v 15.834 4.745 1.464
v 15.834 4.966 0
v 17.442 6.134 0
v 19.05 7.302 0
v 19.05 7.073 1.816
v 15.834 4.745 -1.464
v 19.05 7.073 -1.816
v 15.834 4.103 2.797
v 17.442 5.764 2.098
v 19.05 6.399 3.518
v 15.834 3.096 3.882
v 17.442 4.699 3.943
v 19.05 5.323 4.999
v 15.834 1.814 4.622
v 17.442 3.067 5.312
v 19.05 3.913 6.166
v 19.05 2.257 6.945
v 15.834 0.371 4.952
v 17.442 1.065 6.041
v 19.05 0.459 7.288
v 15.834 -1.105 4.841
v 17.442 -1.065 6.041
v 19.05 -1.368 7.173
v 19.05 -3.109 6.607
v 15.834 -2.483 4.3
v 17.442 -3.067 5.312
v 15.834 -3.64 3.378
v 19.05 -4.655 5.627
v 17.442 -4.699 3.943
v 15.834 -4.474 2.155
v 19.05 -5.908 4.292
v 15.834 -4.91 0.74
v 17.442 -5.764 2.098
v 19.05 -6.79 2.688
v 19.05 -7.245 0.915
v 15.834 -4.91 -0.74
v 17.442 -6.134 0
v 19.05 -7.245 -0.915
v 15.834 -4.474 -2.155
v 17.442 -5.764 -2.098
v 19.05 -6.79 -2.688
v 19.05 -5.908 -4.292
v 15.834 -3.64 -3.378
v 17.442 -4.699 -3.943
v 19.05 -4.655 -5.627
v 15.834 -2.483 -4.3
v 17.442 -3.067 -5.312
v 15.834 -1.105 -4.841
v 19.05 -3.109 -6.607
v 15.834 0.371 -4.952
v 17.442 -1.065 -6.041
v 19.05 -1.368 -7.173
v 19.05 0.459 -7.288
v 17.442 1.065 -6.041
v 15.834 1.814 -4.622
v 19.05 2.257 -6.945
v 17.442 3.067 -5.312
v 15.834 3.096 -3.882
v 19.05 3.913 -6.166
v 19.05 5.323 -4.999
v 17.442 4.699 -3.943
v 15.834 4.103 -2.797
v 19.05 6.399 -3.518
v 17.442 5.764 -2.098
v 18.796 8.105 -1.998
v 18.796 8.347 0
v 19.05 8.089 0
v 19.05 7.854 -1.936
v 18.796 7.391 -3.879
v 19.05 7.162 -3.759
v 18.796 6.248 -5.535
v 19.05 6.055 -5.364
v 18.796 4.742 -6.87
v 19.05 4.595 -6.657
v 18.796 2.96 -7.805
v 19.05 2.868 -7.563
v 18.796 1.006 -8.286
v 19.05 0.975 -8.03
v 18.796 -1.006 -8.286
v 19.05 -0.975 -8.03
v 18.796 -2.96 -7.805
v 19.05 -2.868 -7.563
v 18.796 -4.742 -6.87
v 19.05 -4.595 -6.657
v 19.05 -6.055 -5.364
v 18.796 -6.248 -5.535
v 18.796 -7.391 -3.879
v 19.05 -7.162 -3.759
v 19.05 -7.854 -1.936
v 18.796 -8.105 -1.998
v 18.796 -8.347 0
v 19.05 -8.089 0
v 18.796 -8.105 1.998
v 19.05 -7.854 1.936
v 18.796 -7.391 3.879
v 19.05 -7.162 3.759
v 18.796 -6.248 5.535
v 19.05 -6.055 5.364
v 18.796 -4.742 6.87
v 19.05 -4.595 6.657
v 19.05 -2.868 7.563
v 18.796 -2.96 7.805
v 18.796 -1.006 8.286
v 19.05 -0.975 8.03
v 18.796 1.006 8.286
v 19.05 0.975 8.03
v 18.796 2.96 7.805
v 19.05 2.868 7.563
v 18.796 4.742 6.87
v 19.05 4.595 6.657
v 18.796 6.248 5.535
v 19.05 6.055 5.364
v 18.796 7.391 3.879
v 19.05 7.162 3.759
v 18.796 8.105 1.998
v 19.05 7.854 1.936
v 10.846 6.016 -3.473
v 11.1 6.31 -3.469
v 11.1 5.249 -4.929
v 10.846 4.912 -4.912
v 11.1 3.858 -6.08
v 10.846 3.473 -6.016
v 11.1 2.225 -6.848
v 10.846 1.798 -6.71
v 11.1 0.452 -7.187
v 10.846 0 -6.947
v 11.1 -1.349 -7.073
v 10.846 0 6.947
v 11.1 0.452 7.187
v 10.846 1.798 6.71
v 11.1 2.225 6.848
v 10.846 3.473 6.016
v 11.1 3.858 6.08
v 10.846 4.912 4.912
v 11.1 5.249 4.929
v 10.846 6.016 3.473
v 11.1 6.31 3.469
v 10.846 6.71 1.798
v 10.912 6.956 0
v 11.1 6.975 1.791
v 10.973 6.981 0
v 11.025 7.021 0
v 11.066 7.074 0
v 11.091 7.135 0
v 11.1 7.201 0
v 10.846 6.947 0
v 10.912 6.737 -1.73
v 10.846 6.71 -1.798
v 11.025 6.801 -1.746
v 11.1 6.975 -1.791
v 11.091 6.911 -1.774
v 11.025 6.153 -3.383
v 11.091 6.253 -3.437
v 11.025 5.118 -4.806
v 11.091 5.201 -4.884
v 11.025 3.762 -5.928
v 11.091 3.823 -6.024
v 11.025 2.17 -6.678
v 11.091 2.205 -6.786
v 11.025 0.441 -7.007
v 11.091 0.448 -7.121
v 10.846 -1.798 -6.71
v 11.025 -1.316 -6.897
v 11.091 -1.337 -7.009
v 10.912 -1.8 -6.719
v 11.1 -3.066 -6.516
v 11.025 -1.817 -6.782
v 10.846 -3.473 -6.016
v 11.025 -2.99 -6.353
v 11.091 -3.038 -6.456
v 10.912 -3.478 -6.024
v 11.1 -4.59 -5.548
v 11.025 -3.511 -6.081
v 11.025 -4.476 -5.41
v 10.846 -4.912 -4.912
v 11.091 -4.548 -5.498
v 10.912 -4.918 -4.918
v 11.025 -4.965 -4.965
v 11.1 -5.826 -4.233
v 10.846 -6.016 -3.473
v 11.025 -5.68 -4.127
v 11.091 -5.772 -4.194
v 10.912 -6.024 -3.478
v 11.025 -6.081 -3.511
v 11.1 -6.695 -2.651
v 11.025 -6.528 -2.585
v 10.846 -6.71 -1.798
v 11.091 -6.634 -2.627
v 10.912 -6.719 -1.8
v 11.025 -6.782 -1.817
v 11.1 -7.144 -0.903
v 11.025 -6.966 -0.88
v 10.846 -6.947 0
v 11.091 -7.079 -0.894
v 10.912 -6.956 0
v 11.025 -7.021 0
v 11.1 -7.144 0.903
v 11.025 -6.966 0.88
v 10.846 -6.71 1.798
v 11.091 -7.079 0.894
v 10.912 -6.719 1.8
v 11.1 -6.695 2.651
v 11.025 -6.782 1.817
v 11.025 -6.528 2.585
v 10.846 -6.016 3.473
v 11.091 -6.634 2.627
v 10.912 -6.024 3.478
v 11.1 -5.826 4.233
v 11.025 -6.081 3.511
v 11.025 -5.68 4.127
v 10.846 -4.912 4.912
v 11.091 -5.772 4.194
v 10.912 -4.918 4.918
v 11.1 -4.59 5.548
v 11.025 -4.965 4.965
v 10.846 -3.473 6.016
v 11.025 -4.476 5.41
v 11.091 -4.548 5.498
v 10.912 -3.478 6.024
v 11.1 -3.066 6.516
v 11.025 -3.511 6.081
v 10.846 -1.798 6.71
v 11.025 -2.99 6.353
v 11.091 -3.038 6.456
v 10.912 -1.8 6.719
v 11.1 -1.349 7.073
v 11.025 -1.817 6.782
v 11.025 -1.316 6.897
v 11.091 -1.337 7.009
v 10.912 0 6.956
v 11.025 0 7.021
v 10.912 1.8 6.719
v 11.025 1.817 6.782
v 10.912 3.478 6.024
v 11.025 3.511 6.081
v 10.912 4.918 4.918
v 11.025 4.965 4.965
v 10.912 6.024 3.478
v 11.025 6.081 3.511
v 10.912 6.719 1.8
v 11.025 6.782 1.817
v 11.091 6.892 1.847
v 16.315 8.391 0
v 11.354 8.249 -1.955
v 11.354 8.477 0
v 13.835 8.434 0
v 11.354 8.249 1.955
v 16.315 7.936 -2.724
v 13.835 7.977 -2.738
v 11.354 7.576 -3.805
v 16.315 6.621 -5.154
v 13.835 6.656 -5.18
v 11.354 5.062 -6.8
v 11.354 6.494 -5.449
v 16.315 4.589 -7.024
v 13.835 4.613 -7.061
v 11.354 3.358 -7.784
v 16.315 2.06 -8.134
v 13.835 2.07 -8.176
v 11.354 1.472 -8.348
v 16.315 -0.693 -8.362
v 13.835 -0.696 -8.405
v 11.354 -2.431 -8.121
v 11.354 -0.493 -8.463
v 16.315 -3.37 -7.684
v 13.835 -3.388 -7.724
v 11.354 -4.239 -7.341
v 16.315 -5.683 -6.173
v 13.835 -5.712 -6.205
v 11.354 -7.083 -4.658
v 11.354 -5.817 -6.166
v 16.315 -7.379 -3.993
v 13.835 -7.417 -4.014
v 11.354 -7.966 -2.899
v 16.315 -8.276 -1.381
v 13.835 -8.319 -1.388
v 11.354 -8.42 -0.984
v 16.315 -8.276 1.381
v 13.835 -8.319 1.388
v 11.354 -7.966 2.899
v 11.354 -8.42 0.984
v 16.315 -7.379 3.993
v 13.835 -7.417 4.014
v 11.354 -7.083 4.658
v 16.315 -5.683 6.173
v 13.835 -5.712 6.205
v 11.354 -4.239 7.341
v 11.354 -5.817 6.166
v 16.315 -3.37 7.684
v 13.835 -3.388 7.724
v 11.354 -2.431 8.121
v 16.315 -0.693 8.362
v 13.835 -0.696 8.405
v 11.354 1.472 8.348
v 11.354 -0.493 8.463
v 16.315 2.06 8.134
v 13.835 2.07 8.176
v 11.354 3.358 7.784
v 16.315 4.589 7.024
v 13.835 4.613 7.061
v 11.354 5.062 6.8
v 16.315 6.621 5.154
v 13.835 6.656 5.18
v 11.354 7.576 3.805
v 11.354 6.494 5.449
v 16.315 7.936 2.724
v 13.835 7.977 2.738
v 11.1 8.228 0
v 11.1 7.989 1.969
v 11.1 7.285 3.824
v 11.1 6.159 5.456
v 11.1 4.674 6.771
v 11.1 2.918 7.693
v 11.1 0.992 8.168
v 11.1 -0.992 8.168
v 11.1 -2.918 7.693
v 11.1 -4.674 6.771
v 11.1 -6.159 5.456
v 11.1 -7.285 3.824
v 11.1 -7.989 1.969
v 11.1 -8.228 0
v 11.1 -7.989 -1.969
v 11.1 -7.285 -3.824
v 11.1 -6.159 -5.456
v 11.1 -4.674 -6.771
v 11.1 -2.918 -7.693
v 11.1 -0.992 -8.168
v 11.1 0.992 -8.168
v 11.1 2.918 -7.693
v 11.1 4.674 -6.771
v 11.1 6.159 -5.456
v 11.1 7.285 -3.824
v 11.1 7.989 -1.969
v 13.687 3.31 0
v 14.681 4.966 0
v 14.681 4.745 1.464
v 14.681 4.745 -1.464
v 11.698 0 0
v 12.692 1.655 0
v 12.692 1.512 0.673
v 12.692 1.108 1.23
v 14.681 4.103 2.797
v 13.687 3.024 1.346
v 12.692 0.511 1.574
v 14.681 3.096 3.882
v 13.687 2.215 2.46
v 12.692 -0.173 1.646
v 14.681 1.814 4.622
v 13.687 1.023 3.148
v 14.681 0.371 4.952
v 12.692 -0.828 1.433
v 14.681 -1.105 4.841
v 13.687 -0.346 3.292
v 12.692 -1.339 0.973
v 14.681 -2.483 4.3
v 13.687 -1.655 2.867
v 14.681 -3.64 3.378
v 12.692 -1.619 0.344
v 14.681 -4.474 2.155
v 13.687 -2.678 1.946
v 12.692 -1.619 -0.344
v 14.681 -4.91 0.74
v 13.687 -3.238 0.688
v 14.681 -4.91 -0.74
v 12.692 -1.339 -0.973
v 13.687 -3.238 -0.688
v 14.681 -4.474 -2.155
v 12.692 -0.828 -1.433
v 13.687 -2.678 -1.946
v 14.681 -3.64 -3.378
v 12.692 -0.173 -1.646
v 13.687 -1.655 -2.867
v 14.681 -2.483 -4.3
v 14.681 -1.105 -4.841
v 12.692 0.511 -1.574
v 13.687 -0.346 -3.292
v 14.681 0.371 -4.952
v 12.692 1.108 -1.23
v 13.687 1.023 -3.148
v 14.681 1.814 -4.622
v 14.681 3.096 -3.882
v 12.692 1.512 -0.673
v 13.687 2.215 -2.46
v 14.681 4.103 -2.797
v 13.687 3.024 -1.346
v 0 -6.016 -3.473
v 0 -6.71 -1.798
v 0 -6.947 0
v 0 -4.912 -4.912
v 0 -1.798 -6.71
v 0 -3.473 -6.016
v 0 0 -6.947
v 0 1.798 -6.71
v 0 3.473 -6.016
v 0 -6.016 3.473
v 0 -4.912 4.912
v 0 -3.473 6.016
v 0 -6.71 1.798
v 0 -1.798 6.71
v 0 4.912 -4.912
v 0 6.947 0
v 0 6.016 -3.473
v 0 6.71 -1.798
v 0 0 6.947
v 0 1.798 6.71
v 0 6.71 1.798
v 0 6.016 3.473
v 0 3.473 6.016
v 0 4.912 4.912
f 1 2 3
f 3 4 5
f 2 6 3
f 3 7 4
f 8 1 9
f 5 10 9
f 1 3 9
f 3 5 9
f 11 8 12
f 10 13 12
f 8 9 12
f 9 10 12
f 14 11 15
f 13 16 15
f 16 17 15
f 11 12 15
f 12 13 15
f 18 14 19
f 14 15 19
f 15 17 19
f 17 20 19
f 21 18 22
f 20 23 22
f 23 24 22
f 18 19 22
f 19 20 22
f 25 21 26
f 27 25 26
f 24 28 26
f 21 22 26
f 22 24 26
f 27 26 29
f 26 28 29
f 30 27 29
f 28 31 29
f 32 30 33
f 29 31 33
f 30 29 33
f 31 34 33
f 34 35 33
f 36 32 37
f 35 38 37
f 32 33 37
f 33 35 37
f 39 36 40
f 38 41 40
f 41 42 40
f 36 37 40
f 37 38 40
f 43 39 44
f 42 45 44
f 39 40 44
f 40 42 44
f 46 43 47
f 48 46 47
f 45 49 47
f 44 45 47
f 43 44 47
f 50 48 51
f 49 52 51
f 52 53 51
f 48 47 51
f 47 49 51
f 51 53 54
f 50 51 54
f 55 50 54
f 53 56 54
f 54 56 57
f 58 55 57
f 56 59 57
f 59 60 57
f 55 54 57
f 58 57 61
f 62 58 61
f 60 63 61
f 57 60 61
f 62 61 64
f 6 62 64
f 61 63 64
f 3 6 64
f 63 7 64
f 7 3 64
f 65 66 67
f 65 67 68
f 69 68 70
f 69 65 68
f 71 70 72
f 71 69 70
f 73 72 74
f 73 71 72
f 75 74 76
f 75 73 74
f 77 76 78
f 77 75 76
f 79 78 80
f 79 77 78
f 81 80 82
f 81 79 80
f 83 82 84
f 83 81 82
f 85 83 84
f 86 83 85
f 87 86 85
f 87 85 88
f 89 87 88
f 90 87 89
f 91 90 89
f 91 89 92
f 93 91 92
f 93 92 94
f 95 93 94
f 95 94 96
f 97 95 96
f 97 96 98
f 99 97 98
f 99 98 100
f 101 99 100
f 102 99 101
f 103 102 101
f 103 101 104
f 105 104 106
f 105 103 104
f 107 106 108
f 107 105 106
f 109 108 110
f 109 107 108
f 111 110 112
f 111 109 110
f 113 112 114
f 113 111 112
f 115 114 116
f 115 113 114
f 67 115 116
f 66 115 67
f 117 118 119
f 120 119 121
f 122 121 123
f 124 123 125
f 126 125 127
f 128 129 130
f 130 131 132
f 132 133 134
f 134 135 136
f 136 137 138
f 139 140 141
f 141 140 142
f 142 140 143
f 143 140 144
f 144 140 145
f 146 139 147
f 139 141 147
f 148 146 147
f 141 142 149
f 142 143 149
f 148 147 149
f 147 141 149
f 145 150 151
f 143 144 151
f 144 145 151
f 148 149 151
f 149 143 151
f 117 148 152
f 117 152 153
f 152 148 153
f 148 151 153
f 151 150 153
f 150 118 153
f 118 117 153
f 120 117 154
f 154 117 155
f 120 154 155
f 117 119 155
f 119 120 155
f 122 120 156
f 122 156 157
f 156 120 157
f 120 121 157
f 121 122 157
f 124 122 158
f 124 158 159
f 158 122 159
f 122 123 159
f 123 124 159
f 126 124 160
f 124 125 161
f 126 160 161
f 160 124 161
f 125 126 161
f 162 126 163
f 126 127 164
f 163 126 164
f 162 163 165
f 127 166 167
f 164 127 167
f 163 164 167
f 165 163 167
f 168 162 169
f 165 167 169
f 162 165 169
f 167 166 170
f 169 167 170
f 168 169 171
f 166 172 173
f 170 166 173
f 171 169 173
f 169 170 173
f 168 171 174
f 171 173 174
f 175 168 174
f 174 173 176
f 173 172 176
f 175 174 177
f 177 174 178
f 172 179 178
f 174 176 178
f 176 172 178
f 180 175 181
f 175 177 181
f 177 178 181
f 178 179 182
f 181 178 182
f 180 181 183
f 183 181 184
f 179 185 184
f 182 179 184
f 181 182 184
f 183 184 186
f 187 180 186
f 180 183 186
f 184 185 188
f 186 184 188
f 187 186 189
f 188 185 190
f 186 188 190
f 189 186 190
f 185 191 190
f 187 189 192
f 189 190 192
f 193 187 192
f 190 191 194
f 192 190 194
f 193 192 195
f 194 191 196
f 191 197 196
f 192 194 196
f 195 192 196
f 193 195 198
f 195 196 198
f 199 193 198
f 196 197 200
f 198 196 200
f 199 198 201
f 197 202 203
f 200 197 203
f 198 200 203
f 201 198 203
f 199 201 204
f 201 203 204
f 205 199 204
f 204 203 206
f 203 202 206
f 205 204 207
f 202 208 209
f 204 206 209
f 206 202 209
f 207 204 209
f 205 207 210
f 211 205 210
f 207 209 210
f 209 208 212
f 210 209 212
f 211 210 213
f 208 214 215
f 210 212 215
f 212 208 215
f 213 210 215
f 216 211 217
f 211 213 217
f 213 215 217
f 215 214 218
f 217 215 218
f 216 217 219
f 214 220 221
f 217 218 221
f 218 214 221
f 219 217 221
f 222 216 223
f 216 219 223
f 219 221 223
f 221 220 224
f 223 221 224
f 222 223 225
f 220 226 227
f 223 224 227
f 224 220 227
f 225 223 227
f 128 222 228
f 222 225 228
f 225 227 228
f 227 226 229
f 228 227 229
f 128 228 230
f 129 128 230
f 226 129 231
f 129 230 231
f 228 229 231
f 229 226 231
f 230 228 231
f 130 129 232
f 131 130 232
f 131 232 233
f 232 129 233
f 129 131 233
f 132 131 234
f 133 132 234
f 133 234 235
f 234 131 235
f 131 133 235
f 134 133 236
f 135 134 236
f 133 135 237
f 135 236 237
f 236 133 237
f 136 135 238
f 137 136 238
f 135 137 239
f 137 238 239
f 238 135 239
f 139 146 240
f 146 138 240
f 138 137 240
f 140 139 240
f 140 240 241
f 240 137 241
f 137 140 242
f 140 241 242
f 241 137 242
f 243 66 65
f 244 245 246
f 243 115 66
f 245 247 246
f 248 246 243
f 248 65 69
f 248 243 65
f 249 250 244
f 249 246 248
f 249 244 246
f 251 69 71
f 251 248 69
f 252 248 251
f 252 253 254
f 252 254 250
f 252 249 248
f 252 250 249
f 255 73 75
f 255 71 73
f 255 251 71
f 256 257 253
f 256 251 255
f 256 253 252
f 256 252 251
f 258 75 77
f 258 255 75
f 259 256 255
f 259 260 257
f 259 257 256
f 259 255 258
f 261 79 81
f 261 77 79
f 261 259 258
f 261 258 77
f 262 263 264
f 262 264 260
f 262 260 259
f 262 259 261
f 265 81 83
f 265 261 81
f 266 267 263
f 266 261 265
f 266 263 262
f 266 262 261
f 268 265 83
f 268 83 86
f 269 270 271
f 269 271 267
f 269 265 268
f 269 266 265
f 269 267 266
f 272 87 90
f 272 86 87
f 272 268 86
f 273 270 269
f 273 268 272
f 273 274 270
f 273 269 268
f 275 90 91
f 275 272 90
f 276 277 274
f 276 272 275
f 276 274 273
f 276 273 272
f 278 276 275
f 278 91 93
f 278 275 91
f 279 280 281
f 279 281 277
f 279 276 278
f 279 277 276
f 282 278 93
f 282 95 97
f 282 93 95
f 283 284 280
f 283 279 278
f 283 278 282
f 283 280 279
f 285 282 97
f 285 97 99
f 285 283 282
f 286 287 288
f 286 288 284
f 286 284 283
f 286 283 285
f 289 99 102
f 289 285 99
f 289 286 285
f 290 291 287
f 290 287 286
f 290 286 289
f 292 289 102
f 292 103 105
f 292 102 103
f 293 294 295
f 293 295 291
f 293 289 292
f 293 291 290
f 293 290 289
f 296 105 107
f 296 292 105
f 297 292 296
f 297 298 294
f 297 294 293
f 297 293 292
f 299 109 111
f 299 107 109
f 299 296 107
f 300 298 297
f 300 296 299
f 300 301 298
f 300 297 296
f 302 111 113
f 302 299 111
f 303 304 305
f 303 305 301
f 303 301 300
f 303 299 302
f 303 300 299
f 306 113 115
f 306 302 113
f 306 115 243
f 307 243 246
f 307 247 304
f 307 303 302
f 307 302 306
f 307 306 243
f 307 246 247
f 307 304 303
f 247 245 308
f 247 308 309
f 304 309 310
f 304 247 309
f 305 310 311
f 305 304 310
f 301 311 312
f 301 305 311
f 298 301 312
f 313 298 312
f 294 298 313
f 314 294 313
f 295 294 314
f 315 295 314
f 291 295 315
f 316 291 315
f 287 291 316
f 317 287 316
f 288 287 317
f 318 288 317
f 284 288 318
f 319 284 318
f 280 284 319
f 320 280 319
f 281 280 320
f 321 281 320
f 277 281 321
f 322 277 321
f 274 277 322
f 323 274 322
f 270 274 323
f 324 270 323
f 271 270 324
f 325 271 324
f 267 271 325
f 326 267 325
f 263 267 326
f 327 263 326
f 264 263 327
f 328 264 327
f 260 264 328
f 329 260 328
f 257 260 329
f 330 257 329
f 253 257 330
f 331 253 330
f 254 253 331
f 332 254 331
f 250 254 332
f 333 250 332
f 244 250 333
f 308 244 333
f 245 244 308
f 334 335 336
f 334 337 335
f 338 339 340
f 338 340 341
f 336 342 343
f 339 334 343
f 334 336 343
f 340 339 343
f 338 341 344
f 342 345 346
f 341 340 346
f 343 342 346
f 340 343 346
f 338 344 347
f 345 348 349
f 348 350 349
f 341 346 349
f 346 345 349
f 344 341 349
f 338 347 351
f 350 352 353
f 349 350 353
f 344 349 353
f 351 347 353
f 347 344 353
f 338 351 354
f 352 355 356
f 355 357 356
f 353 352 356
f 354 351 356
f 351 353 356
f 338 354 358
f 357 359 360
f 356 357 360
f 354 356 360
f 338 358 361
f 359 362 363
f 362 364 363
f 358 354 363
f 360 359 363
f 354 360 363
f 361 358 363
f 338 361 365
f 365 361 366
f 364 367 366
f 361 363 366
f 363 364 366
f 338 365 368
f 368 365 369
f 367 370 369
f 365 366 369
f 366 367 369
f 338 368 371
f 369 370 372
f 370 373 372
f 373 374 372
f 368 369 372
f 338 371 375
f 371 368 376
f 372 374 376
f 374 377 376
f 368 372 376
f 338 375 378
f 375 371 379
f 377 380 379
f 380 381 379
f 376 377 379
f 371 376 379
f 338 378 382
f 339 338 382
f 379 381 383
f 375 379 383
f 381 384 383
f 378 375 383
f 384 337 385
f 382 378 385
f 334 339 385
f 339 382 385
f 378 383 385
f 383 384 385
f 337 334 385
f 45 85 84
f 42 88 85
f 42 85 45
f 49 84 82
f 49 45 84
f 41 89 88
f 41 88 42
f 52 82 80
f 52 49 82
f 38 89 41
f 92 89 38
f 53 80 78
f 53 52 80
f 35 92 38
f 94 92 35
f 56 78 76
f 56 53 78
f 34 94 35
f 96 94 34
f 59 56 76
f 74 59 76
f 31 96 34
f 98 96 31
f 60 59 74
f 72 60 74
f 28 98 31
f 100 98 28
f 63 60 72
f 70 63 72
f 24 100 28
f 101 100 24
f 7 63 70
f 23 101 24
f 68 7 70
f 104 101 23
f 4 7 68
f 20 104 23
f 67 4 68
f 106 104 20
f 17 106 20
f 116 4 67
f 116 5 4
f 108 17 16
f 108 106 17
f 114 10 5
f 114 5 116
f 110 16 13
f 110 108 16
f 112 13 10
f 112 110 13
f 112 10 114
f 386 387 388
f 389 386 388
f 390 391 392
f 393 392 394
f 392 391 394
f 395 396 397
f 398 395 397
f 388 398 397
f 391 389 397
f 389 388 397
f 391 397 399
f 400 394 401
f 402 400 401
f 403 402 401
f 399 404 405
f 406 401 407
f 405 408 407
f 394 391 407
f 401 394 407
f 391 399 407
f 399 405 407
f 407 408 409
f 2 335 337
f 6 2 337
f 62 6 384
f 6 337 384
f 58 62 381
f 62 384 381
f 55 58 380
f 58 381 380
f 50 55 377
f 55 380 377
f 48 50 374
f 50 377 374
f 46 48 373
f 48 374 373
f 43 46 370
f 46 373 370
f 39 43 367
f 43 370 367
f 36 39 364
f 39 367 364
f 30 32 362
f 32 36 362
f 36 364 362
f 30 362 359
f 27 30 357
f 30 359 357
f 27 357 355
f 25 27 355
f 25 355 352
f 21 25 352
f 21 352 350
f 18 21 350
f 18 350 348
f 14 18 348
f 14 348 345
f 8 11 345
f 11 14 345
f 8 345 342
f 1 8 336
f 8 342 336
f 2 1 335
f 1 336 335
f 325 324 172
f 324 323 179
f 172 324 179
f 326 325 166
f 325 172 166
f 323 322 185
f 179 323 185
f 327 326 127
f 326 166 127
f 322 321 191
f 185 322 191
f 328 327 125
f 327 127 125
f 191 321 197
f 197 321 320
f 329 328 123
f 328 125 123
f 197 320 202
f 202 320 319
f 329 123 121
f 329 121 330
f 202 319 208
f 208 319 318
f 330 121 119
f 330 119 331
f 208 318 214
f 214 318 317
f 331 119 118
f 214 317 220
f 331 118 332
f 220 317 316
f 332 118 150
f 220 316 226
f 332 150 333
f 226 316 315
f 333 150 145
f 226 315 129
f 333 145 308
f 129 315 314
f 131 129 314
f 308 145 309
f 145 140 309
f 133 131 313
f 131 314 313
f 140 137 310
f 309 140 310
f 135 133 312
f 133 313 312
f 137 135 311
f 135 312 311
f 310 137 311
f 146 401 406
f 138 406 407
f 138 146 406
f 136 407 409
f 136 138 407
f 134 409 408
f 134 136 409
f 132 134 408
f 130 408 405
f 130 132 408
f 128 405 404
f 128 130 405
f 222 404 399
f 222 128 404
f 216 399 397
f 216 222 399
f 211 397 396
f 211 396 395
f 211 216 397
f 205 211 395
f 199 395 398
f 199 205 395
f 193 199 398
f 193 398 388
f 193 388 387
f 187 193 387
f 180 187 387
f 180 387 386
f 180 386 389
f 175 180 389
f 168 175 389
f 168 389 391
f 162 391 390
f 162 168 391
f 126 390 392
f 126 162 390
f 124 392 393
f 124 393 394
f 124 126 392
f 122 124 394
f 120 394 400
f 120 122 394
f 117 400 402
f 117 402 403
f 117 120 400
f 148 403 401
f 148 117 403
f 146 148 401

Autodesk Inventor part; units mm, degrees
ref_plane "YZ Plane" through (0, 0, 0) normal (1, 0, 0) x (0, 1, 0)
ref_plane "XZ Plane" through (0, 0, 0) normal (0, 1, 0) x (-1, 0, 0)
ref_plane "XY Plane" through (0, 0, 0) normal (0, 0, 1) x (1, 0, 0)
sketch "Sketch1" plane through (0, 0, 0) normal (0, 0, 1) x (1, 0, 0)
  line L0 (0, 0) -> (0, 6.9469)
  line L1 (0, 6.9469) -> (10.8458, 6.9469)
  line L2 (11.0998, 7.2009) -> (11.0998, 8.2277)
  line L3 (11.3538, 8.4772) -> (18.796, 8.3473)
  line L4 (19.05, 8.0889) -> (19.05, 7.3025)
  line L5 (19.05, 7.3025) -> (15.8337, 4.9657)
  line L6 (15.8337, 4.9657) -> (14.6812, 4.9657)
  line L7 (0, 0) -> (11.6975, 0)
  line L8 (11.6975, 0) -> (14.6812, 4.9657)
  arc A0 (10.8458, 6.9469) -> (11.0998, 7.2009) centre (10.8458, 7.2009) ccw
  line L9 (19.05, 8.0889) -> (18.796, 8.3473)
  line L10 (11.0998, 8.2277) -> (11.3538, 8.4772)
  point P0 (11.0998, 6.9469)
  point P1 (11.0998, 8.4817)
  point P2 (19.05, 8.3429)
  dimension "d0" = 6.9469
  dimension "d1" = 8.6741
  dimension "d2" = 7.9502
  dimension "d3" = 19.05
  dimension "d4" = 4.9657
  dimension "d5" = 4.3688
  dimension "d6" = 37
  dimension "d7" = 7.3025
  dimension "d8" = 59
  dimension "d11" = 0.254
  dimension "d12" = 0.254
  dimension "d13" = 0.254
  dimension "d14" = 0.254
  dimension "d15" = 0.254
  dimension "d16" = 1
revolve "Revolution1" add sketch "Sketch1" angle 360 about axis through (0, 0, 0) along (1, 0, 0)
equation "\"d0\" = 0.5 * AN929_C"
equation "\"d1\" = 0.5 * AN929_B"
equation "\"d2\" = AN929_D"
equation "\"d3\" = AN929_H"
equation "\"d4\" = 0.5 * AN929_F"
equation "\"d5\" = AN929_E"
equation "\"d7\" = 0.5 * AN929_G"
equation "\"d11\" = AN929_R"
equation "\"d13\" = d12"
equation "\"d14\" = d12"
equation "\"d15\" = d14"
equation "\"Tube_OD\" = 12.7"
equation "\"AN929_B\" = 17.3482"
equation "\"AN929_C\" = 13.8938"
equation "\"AN929_D\" = 7.9502"
equation "\"AN929_E\" = 4.3688"
equation "\"AN929_F\" = 9.9314"
equation "\"AN929_G\" = 14.605"
equation "\"AN929_H\" = 19.05"
equation "\"AN929_R\" = 0.254"
properties part number "AN929-8D" material "Aluminum 2014-T6"
